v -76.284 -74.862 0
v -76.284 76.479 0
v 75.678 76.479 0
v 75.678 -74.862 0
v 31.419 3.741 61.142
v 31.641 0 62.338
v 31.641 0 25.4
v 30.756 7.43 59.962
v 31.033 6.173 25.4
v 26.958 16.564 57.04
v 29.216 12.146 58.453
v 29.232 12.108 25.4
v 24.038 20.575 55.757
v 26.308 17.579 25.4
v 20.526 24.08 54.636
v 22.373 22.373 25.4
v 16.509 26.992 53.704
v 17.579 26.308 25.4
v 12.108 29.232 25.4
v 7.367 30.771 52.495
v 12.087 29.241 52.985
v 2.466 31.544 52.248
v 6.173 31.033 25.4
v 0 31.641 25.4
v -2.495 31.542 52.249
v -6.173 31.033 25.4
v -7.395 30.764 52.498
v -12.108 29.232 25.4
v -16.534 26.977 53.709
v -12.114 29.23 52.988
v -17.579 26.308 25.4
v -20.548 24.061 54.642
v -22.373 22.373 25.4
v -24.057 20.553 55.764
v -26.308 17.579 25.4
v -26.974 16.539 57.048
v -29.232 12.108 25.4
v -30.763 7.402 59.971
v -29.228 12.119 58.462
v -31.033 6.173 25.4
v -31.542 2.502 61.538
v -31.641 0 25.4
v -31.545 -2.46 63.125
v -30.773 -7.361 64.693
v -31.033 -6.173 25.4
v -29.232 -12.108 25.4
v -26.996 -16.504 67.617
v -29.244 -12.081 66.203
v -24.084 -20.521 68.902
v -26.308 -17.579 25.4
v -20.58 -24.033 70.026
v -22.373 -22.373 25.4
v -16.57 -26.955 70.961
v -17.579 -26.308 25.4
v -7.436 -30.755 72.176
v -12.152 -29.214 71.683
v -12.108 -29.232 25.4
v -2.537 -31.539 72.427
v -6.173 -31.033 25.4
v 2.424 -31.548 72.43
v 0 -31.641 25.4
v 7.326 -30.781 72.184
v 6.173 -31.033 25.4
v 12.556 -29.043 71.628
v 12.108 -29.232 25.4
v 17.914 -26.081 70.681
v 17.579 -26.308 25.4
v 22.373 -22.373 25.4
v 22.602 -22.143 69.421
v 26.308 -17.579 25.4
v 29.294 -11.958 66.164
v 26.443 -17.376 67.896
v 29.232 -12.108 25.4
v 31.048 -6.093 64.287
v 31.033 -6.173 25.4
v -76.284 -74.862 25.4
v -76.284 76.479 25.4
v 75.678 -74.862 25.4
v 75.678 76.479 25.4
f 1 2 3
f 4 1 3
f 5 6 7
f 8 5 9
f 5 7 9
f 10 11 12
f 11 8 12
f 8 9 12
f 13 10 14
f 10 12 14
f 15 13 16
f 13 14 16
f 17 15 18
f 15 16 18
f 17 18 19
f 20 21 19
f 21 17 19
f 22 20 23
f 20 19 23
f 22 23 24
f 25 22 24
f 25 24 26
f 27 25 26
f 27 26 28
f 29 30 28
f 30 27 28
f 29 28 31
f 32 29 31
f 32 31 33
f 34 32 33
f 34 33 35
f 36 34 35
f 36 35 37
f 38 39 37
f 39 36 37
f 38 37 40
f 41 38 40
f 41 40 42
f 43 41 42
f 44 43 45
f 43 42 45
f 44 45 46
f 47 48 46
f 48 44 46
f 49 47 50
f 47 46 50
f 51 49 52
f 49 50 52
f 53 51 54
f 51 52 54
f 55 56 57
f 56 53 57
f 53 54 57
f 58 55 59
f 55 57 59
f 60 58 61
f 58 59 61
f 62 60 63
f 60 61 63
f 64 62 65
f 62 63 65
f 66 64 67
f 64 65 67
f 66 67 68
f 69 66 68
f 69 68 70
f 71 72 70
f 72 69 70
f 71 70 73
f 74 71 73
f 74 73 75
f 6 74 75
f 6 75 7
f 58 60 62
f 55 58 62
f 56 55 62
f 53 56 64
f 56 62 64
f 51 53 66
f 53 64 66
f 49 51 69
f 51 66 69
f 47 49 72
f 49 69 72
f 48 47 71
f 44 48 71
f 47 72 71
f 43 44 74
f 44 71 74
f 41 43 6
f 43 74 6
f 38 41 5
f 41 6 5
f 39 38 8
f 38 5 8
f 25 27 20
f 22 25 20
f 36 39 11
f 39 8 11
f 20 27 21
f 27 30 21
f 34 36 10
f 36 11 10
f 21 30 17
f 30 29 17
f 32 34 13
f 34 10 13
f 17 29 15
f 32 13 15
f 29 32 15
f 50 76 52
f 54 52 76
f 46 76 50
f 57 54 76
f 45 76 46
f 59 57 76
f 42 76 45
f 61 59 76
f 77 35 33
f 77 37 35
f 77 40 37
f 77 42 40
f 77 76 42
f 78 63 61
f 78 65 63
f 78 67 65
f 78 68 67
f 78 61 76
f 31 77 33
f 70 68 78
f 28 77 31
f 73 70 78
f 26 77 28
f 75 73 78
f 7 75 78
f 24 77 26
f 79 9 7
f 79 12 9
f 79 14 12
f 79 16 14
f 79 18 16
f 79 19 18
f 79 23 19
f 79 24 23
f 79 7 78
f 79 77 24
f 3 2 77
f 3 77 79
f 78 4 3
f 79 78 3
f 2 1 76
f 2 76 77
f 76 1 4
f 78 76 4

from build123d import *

# Parameters (mm, degrees)
F0_W     = 151.962713
F0_H     = 151.340999
F1_DEPTH = 25.4
F2_R     = 31.640714
F3_DEPTH = 50.8
F5_DEPTH = 74.422


with BuildPart() as f1:
    # F0 (on Top) → F1 (new body)
    with BuildSketch(Plane.XY):
        with Locations((-0.302956, 0.808675)):
            Rectangle(F0_W, F0_H)
    extrude(amount=F1_DEPTH)

    # F2 (on face) → F3 (join)
    with BuildSketch(Plane.XY.offset(25.4)):
        Circle(F2_R)
    extrude(amount=F3_DEPTH)

    # F4 (on Right) → F5 (cut, symmetric)
    with BuildSketch(Plane.YZ):
        Polygon((52.56303, 76.373637), (-43.877404, 76.373637), (52.56303, 45.524683), align=None)
    extrude(amount=F5_DEPTH, both=True, mode=Mode.SUBTRACT)


solid = f1.part
